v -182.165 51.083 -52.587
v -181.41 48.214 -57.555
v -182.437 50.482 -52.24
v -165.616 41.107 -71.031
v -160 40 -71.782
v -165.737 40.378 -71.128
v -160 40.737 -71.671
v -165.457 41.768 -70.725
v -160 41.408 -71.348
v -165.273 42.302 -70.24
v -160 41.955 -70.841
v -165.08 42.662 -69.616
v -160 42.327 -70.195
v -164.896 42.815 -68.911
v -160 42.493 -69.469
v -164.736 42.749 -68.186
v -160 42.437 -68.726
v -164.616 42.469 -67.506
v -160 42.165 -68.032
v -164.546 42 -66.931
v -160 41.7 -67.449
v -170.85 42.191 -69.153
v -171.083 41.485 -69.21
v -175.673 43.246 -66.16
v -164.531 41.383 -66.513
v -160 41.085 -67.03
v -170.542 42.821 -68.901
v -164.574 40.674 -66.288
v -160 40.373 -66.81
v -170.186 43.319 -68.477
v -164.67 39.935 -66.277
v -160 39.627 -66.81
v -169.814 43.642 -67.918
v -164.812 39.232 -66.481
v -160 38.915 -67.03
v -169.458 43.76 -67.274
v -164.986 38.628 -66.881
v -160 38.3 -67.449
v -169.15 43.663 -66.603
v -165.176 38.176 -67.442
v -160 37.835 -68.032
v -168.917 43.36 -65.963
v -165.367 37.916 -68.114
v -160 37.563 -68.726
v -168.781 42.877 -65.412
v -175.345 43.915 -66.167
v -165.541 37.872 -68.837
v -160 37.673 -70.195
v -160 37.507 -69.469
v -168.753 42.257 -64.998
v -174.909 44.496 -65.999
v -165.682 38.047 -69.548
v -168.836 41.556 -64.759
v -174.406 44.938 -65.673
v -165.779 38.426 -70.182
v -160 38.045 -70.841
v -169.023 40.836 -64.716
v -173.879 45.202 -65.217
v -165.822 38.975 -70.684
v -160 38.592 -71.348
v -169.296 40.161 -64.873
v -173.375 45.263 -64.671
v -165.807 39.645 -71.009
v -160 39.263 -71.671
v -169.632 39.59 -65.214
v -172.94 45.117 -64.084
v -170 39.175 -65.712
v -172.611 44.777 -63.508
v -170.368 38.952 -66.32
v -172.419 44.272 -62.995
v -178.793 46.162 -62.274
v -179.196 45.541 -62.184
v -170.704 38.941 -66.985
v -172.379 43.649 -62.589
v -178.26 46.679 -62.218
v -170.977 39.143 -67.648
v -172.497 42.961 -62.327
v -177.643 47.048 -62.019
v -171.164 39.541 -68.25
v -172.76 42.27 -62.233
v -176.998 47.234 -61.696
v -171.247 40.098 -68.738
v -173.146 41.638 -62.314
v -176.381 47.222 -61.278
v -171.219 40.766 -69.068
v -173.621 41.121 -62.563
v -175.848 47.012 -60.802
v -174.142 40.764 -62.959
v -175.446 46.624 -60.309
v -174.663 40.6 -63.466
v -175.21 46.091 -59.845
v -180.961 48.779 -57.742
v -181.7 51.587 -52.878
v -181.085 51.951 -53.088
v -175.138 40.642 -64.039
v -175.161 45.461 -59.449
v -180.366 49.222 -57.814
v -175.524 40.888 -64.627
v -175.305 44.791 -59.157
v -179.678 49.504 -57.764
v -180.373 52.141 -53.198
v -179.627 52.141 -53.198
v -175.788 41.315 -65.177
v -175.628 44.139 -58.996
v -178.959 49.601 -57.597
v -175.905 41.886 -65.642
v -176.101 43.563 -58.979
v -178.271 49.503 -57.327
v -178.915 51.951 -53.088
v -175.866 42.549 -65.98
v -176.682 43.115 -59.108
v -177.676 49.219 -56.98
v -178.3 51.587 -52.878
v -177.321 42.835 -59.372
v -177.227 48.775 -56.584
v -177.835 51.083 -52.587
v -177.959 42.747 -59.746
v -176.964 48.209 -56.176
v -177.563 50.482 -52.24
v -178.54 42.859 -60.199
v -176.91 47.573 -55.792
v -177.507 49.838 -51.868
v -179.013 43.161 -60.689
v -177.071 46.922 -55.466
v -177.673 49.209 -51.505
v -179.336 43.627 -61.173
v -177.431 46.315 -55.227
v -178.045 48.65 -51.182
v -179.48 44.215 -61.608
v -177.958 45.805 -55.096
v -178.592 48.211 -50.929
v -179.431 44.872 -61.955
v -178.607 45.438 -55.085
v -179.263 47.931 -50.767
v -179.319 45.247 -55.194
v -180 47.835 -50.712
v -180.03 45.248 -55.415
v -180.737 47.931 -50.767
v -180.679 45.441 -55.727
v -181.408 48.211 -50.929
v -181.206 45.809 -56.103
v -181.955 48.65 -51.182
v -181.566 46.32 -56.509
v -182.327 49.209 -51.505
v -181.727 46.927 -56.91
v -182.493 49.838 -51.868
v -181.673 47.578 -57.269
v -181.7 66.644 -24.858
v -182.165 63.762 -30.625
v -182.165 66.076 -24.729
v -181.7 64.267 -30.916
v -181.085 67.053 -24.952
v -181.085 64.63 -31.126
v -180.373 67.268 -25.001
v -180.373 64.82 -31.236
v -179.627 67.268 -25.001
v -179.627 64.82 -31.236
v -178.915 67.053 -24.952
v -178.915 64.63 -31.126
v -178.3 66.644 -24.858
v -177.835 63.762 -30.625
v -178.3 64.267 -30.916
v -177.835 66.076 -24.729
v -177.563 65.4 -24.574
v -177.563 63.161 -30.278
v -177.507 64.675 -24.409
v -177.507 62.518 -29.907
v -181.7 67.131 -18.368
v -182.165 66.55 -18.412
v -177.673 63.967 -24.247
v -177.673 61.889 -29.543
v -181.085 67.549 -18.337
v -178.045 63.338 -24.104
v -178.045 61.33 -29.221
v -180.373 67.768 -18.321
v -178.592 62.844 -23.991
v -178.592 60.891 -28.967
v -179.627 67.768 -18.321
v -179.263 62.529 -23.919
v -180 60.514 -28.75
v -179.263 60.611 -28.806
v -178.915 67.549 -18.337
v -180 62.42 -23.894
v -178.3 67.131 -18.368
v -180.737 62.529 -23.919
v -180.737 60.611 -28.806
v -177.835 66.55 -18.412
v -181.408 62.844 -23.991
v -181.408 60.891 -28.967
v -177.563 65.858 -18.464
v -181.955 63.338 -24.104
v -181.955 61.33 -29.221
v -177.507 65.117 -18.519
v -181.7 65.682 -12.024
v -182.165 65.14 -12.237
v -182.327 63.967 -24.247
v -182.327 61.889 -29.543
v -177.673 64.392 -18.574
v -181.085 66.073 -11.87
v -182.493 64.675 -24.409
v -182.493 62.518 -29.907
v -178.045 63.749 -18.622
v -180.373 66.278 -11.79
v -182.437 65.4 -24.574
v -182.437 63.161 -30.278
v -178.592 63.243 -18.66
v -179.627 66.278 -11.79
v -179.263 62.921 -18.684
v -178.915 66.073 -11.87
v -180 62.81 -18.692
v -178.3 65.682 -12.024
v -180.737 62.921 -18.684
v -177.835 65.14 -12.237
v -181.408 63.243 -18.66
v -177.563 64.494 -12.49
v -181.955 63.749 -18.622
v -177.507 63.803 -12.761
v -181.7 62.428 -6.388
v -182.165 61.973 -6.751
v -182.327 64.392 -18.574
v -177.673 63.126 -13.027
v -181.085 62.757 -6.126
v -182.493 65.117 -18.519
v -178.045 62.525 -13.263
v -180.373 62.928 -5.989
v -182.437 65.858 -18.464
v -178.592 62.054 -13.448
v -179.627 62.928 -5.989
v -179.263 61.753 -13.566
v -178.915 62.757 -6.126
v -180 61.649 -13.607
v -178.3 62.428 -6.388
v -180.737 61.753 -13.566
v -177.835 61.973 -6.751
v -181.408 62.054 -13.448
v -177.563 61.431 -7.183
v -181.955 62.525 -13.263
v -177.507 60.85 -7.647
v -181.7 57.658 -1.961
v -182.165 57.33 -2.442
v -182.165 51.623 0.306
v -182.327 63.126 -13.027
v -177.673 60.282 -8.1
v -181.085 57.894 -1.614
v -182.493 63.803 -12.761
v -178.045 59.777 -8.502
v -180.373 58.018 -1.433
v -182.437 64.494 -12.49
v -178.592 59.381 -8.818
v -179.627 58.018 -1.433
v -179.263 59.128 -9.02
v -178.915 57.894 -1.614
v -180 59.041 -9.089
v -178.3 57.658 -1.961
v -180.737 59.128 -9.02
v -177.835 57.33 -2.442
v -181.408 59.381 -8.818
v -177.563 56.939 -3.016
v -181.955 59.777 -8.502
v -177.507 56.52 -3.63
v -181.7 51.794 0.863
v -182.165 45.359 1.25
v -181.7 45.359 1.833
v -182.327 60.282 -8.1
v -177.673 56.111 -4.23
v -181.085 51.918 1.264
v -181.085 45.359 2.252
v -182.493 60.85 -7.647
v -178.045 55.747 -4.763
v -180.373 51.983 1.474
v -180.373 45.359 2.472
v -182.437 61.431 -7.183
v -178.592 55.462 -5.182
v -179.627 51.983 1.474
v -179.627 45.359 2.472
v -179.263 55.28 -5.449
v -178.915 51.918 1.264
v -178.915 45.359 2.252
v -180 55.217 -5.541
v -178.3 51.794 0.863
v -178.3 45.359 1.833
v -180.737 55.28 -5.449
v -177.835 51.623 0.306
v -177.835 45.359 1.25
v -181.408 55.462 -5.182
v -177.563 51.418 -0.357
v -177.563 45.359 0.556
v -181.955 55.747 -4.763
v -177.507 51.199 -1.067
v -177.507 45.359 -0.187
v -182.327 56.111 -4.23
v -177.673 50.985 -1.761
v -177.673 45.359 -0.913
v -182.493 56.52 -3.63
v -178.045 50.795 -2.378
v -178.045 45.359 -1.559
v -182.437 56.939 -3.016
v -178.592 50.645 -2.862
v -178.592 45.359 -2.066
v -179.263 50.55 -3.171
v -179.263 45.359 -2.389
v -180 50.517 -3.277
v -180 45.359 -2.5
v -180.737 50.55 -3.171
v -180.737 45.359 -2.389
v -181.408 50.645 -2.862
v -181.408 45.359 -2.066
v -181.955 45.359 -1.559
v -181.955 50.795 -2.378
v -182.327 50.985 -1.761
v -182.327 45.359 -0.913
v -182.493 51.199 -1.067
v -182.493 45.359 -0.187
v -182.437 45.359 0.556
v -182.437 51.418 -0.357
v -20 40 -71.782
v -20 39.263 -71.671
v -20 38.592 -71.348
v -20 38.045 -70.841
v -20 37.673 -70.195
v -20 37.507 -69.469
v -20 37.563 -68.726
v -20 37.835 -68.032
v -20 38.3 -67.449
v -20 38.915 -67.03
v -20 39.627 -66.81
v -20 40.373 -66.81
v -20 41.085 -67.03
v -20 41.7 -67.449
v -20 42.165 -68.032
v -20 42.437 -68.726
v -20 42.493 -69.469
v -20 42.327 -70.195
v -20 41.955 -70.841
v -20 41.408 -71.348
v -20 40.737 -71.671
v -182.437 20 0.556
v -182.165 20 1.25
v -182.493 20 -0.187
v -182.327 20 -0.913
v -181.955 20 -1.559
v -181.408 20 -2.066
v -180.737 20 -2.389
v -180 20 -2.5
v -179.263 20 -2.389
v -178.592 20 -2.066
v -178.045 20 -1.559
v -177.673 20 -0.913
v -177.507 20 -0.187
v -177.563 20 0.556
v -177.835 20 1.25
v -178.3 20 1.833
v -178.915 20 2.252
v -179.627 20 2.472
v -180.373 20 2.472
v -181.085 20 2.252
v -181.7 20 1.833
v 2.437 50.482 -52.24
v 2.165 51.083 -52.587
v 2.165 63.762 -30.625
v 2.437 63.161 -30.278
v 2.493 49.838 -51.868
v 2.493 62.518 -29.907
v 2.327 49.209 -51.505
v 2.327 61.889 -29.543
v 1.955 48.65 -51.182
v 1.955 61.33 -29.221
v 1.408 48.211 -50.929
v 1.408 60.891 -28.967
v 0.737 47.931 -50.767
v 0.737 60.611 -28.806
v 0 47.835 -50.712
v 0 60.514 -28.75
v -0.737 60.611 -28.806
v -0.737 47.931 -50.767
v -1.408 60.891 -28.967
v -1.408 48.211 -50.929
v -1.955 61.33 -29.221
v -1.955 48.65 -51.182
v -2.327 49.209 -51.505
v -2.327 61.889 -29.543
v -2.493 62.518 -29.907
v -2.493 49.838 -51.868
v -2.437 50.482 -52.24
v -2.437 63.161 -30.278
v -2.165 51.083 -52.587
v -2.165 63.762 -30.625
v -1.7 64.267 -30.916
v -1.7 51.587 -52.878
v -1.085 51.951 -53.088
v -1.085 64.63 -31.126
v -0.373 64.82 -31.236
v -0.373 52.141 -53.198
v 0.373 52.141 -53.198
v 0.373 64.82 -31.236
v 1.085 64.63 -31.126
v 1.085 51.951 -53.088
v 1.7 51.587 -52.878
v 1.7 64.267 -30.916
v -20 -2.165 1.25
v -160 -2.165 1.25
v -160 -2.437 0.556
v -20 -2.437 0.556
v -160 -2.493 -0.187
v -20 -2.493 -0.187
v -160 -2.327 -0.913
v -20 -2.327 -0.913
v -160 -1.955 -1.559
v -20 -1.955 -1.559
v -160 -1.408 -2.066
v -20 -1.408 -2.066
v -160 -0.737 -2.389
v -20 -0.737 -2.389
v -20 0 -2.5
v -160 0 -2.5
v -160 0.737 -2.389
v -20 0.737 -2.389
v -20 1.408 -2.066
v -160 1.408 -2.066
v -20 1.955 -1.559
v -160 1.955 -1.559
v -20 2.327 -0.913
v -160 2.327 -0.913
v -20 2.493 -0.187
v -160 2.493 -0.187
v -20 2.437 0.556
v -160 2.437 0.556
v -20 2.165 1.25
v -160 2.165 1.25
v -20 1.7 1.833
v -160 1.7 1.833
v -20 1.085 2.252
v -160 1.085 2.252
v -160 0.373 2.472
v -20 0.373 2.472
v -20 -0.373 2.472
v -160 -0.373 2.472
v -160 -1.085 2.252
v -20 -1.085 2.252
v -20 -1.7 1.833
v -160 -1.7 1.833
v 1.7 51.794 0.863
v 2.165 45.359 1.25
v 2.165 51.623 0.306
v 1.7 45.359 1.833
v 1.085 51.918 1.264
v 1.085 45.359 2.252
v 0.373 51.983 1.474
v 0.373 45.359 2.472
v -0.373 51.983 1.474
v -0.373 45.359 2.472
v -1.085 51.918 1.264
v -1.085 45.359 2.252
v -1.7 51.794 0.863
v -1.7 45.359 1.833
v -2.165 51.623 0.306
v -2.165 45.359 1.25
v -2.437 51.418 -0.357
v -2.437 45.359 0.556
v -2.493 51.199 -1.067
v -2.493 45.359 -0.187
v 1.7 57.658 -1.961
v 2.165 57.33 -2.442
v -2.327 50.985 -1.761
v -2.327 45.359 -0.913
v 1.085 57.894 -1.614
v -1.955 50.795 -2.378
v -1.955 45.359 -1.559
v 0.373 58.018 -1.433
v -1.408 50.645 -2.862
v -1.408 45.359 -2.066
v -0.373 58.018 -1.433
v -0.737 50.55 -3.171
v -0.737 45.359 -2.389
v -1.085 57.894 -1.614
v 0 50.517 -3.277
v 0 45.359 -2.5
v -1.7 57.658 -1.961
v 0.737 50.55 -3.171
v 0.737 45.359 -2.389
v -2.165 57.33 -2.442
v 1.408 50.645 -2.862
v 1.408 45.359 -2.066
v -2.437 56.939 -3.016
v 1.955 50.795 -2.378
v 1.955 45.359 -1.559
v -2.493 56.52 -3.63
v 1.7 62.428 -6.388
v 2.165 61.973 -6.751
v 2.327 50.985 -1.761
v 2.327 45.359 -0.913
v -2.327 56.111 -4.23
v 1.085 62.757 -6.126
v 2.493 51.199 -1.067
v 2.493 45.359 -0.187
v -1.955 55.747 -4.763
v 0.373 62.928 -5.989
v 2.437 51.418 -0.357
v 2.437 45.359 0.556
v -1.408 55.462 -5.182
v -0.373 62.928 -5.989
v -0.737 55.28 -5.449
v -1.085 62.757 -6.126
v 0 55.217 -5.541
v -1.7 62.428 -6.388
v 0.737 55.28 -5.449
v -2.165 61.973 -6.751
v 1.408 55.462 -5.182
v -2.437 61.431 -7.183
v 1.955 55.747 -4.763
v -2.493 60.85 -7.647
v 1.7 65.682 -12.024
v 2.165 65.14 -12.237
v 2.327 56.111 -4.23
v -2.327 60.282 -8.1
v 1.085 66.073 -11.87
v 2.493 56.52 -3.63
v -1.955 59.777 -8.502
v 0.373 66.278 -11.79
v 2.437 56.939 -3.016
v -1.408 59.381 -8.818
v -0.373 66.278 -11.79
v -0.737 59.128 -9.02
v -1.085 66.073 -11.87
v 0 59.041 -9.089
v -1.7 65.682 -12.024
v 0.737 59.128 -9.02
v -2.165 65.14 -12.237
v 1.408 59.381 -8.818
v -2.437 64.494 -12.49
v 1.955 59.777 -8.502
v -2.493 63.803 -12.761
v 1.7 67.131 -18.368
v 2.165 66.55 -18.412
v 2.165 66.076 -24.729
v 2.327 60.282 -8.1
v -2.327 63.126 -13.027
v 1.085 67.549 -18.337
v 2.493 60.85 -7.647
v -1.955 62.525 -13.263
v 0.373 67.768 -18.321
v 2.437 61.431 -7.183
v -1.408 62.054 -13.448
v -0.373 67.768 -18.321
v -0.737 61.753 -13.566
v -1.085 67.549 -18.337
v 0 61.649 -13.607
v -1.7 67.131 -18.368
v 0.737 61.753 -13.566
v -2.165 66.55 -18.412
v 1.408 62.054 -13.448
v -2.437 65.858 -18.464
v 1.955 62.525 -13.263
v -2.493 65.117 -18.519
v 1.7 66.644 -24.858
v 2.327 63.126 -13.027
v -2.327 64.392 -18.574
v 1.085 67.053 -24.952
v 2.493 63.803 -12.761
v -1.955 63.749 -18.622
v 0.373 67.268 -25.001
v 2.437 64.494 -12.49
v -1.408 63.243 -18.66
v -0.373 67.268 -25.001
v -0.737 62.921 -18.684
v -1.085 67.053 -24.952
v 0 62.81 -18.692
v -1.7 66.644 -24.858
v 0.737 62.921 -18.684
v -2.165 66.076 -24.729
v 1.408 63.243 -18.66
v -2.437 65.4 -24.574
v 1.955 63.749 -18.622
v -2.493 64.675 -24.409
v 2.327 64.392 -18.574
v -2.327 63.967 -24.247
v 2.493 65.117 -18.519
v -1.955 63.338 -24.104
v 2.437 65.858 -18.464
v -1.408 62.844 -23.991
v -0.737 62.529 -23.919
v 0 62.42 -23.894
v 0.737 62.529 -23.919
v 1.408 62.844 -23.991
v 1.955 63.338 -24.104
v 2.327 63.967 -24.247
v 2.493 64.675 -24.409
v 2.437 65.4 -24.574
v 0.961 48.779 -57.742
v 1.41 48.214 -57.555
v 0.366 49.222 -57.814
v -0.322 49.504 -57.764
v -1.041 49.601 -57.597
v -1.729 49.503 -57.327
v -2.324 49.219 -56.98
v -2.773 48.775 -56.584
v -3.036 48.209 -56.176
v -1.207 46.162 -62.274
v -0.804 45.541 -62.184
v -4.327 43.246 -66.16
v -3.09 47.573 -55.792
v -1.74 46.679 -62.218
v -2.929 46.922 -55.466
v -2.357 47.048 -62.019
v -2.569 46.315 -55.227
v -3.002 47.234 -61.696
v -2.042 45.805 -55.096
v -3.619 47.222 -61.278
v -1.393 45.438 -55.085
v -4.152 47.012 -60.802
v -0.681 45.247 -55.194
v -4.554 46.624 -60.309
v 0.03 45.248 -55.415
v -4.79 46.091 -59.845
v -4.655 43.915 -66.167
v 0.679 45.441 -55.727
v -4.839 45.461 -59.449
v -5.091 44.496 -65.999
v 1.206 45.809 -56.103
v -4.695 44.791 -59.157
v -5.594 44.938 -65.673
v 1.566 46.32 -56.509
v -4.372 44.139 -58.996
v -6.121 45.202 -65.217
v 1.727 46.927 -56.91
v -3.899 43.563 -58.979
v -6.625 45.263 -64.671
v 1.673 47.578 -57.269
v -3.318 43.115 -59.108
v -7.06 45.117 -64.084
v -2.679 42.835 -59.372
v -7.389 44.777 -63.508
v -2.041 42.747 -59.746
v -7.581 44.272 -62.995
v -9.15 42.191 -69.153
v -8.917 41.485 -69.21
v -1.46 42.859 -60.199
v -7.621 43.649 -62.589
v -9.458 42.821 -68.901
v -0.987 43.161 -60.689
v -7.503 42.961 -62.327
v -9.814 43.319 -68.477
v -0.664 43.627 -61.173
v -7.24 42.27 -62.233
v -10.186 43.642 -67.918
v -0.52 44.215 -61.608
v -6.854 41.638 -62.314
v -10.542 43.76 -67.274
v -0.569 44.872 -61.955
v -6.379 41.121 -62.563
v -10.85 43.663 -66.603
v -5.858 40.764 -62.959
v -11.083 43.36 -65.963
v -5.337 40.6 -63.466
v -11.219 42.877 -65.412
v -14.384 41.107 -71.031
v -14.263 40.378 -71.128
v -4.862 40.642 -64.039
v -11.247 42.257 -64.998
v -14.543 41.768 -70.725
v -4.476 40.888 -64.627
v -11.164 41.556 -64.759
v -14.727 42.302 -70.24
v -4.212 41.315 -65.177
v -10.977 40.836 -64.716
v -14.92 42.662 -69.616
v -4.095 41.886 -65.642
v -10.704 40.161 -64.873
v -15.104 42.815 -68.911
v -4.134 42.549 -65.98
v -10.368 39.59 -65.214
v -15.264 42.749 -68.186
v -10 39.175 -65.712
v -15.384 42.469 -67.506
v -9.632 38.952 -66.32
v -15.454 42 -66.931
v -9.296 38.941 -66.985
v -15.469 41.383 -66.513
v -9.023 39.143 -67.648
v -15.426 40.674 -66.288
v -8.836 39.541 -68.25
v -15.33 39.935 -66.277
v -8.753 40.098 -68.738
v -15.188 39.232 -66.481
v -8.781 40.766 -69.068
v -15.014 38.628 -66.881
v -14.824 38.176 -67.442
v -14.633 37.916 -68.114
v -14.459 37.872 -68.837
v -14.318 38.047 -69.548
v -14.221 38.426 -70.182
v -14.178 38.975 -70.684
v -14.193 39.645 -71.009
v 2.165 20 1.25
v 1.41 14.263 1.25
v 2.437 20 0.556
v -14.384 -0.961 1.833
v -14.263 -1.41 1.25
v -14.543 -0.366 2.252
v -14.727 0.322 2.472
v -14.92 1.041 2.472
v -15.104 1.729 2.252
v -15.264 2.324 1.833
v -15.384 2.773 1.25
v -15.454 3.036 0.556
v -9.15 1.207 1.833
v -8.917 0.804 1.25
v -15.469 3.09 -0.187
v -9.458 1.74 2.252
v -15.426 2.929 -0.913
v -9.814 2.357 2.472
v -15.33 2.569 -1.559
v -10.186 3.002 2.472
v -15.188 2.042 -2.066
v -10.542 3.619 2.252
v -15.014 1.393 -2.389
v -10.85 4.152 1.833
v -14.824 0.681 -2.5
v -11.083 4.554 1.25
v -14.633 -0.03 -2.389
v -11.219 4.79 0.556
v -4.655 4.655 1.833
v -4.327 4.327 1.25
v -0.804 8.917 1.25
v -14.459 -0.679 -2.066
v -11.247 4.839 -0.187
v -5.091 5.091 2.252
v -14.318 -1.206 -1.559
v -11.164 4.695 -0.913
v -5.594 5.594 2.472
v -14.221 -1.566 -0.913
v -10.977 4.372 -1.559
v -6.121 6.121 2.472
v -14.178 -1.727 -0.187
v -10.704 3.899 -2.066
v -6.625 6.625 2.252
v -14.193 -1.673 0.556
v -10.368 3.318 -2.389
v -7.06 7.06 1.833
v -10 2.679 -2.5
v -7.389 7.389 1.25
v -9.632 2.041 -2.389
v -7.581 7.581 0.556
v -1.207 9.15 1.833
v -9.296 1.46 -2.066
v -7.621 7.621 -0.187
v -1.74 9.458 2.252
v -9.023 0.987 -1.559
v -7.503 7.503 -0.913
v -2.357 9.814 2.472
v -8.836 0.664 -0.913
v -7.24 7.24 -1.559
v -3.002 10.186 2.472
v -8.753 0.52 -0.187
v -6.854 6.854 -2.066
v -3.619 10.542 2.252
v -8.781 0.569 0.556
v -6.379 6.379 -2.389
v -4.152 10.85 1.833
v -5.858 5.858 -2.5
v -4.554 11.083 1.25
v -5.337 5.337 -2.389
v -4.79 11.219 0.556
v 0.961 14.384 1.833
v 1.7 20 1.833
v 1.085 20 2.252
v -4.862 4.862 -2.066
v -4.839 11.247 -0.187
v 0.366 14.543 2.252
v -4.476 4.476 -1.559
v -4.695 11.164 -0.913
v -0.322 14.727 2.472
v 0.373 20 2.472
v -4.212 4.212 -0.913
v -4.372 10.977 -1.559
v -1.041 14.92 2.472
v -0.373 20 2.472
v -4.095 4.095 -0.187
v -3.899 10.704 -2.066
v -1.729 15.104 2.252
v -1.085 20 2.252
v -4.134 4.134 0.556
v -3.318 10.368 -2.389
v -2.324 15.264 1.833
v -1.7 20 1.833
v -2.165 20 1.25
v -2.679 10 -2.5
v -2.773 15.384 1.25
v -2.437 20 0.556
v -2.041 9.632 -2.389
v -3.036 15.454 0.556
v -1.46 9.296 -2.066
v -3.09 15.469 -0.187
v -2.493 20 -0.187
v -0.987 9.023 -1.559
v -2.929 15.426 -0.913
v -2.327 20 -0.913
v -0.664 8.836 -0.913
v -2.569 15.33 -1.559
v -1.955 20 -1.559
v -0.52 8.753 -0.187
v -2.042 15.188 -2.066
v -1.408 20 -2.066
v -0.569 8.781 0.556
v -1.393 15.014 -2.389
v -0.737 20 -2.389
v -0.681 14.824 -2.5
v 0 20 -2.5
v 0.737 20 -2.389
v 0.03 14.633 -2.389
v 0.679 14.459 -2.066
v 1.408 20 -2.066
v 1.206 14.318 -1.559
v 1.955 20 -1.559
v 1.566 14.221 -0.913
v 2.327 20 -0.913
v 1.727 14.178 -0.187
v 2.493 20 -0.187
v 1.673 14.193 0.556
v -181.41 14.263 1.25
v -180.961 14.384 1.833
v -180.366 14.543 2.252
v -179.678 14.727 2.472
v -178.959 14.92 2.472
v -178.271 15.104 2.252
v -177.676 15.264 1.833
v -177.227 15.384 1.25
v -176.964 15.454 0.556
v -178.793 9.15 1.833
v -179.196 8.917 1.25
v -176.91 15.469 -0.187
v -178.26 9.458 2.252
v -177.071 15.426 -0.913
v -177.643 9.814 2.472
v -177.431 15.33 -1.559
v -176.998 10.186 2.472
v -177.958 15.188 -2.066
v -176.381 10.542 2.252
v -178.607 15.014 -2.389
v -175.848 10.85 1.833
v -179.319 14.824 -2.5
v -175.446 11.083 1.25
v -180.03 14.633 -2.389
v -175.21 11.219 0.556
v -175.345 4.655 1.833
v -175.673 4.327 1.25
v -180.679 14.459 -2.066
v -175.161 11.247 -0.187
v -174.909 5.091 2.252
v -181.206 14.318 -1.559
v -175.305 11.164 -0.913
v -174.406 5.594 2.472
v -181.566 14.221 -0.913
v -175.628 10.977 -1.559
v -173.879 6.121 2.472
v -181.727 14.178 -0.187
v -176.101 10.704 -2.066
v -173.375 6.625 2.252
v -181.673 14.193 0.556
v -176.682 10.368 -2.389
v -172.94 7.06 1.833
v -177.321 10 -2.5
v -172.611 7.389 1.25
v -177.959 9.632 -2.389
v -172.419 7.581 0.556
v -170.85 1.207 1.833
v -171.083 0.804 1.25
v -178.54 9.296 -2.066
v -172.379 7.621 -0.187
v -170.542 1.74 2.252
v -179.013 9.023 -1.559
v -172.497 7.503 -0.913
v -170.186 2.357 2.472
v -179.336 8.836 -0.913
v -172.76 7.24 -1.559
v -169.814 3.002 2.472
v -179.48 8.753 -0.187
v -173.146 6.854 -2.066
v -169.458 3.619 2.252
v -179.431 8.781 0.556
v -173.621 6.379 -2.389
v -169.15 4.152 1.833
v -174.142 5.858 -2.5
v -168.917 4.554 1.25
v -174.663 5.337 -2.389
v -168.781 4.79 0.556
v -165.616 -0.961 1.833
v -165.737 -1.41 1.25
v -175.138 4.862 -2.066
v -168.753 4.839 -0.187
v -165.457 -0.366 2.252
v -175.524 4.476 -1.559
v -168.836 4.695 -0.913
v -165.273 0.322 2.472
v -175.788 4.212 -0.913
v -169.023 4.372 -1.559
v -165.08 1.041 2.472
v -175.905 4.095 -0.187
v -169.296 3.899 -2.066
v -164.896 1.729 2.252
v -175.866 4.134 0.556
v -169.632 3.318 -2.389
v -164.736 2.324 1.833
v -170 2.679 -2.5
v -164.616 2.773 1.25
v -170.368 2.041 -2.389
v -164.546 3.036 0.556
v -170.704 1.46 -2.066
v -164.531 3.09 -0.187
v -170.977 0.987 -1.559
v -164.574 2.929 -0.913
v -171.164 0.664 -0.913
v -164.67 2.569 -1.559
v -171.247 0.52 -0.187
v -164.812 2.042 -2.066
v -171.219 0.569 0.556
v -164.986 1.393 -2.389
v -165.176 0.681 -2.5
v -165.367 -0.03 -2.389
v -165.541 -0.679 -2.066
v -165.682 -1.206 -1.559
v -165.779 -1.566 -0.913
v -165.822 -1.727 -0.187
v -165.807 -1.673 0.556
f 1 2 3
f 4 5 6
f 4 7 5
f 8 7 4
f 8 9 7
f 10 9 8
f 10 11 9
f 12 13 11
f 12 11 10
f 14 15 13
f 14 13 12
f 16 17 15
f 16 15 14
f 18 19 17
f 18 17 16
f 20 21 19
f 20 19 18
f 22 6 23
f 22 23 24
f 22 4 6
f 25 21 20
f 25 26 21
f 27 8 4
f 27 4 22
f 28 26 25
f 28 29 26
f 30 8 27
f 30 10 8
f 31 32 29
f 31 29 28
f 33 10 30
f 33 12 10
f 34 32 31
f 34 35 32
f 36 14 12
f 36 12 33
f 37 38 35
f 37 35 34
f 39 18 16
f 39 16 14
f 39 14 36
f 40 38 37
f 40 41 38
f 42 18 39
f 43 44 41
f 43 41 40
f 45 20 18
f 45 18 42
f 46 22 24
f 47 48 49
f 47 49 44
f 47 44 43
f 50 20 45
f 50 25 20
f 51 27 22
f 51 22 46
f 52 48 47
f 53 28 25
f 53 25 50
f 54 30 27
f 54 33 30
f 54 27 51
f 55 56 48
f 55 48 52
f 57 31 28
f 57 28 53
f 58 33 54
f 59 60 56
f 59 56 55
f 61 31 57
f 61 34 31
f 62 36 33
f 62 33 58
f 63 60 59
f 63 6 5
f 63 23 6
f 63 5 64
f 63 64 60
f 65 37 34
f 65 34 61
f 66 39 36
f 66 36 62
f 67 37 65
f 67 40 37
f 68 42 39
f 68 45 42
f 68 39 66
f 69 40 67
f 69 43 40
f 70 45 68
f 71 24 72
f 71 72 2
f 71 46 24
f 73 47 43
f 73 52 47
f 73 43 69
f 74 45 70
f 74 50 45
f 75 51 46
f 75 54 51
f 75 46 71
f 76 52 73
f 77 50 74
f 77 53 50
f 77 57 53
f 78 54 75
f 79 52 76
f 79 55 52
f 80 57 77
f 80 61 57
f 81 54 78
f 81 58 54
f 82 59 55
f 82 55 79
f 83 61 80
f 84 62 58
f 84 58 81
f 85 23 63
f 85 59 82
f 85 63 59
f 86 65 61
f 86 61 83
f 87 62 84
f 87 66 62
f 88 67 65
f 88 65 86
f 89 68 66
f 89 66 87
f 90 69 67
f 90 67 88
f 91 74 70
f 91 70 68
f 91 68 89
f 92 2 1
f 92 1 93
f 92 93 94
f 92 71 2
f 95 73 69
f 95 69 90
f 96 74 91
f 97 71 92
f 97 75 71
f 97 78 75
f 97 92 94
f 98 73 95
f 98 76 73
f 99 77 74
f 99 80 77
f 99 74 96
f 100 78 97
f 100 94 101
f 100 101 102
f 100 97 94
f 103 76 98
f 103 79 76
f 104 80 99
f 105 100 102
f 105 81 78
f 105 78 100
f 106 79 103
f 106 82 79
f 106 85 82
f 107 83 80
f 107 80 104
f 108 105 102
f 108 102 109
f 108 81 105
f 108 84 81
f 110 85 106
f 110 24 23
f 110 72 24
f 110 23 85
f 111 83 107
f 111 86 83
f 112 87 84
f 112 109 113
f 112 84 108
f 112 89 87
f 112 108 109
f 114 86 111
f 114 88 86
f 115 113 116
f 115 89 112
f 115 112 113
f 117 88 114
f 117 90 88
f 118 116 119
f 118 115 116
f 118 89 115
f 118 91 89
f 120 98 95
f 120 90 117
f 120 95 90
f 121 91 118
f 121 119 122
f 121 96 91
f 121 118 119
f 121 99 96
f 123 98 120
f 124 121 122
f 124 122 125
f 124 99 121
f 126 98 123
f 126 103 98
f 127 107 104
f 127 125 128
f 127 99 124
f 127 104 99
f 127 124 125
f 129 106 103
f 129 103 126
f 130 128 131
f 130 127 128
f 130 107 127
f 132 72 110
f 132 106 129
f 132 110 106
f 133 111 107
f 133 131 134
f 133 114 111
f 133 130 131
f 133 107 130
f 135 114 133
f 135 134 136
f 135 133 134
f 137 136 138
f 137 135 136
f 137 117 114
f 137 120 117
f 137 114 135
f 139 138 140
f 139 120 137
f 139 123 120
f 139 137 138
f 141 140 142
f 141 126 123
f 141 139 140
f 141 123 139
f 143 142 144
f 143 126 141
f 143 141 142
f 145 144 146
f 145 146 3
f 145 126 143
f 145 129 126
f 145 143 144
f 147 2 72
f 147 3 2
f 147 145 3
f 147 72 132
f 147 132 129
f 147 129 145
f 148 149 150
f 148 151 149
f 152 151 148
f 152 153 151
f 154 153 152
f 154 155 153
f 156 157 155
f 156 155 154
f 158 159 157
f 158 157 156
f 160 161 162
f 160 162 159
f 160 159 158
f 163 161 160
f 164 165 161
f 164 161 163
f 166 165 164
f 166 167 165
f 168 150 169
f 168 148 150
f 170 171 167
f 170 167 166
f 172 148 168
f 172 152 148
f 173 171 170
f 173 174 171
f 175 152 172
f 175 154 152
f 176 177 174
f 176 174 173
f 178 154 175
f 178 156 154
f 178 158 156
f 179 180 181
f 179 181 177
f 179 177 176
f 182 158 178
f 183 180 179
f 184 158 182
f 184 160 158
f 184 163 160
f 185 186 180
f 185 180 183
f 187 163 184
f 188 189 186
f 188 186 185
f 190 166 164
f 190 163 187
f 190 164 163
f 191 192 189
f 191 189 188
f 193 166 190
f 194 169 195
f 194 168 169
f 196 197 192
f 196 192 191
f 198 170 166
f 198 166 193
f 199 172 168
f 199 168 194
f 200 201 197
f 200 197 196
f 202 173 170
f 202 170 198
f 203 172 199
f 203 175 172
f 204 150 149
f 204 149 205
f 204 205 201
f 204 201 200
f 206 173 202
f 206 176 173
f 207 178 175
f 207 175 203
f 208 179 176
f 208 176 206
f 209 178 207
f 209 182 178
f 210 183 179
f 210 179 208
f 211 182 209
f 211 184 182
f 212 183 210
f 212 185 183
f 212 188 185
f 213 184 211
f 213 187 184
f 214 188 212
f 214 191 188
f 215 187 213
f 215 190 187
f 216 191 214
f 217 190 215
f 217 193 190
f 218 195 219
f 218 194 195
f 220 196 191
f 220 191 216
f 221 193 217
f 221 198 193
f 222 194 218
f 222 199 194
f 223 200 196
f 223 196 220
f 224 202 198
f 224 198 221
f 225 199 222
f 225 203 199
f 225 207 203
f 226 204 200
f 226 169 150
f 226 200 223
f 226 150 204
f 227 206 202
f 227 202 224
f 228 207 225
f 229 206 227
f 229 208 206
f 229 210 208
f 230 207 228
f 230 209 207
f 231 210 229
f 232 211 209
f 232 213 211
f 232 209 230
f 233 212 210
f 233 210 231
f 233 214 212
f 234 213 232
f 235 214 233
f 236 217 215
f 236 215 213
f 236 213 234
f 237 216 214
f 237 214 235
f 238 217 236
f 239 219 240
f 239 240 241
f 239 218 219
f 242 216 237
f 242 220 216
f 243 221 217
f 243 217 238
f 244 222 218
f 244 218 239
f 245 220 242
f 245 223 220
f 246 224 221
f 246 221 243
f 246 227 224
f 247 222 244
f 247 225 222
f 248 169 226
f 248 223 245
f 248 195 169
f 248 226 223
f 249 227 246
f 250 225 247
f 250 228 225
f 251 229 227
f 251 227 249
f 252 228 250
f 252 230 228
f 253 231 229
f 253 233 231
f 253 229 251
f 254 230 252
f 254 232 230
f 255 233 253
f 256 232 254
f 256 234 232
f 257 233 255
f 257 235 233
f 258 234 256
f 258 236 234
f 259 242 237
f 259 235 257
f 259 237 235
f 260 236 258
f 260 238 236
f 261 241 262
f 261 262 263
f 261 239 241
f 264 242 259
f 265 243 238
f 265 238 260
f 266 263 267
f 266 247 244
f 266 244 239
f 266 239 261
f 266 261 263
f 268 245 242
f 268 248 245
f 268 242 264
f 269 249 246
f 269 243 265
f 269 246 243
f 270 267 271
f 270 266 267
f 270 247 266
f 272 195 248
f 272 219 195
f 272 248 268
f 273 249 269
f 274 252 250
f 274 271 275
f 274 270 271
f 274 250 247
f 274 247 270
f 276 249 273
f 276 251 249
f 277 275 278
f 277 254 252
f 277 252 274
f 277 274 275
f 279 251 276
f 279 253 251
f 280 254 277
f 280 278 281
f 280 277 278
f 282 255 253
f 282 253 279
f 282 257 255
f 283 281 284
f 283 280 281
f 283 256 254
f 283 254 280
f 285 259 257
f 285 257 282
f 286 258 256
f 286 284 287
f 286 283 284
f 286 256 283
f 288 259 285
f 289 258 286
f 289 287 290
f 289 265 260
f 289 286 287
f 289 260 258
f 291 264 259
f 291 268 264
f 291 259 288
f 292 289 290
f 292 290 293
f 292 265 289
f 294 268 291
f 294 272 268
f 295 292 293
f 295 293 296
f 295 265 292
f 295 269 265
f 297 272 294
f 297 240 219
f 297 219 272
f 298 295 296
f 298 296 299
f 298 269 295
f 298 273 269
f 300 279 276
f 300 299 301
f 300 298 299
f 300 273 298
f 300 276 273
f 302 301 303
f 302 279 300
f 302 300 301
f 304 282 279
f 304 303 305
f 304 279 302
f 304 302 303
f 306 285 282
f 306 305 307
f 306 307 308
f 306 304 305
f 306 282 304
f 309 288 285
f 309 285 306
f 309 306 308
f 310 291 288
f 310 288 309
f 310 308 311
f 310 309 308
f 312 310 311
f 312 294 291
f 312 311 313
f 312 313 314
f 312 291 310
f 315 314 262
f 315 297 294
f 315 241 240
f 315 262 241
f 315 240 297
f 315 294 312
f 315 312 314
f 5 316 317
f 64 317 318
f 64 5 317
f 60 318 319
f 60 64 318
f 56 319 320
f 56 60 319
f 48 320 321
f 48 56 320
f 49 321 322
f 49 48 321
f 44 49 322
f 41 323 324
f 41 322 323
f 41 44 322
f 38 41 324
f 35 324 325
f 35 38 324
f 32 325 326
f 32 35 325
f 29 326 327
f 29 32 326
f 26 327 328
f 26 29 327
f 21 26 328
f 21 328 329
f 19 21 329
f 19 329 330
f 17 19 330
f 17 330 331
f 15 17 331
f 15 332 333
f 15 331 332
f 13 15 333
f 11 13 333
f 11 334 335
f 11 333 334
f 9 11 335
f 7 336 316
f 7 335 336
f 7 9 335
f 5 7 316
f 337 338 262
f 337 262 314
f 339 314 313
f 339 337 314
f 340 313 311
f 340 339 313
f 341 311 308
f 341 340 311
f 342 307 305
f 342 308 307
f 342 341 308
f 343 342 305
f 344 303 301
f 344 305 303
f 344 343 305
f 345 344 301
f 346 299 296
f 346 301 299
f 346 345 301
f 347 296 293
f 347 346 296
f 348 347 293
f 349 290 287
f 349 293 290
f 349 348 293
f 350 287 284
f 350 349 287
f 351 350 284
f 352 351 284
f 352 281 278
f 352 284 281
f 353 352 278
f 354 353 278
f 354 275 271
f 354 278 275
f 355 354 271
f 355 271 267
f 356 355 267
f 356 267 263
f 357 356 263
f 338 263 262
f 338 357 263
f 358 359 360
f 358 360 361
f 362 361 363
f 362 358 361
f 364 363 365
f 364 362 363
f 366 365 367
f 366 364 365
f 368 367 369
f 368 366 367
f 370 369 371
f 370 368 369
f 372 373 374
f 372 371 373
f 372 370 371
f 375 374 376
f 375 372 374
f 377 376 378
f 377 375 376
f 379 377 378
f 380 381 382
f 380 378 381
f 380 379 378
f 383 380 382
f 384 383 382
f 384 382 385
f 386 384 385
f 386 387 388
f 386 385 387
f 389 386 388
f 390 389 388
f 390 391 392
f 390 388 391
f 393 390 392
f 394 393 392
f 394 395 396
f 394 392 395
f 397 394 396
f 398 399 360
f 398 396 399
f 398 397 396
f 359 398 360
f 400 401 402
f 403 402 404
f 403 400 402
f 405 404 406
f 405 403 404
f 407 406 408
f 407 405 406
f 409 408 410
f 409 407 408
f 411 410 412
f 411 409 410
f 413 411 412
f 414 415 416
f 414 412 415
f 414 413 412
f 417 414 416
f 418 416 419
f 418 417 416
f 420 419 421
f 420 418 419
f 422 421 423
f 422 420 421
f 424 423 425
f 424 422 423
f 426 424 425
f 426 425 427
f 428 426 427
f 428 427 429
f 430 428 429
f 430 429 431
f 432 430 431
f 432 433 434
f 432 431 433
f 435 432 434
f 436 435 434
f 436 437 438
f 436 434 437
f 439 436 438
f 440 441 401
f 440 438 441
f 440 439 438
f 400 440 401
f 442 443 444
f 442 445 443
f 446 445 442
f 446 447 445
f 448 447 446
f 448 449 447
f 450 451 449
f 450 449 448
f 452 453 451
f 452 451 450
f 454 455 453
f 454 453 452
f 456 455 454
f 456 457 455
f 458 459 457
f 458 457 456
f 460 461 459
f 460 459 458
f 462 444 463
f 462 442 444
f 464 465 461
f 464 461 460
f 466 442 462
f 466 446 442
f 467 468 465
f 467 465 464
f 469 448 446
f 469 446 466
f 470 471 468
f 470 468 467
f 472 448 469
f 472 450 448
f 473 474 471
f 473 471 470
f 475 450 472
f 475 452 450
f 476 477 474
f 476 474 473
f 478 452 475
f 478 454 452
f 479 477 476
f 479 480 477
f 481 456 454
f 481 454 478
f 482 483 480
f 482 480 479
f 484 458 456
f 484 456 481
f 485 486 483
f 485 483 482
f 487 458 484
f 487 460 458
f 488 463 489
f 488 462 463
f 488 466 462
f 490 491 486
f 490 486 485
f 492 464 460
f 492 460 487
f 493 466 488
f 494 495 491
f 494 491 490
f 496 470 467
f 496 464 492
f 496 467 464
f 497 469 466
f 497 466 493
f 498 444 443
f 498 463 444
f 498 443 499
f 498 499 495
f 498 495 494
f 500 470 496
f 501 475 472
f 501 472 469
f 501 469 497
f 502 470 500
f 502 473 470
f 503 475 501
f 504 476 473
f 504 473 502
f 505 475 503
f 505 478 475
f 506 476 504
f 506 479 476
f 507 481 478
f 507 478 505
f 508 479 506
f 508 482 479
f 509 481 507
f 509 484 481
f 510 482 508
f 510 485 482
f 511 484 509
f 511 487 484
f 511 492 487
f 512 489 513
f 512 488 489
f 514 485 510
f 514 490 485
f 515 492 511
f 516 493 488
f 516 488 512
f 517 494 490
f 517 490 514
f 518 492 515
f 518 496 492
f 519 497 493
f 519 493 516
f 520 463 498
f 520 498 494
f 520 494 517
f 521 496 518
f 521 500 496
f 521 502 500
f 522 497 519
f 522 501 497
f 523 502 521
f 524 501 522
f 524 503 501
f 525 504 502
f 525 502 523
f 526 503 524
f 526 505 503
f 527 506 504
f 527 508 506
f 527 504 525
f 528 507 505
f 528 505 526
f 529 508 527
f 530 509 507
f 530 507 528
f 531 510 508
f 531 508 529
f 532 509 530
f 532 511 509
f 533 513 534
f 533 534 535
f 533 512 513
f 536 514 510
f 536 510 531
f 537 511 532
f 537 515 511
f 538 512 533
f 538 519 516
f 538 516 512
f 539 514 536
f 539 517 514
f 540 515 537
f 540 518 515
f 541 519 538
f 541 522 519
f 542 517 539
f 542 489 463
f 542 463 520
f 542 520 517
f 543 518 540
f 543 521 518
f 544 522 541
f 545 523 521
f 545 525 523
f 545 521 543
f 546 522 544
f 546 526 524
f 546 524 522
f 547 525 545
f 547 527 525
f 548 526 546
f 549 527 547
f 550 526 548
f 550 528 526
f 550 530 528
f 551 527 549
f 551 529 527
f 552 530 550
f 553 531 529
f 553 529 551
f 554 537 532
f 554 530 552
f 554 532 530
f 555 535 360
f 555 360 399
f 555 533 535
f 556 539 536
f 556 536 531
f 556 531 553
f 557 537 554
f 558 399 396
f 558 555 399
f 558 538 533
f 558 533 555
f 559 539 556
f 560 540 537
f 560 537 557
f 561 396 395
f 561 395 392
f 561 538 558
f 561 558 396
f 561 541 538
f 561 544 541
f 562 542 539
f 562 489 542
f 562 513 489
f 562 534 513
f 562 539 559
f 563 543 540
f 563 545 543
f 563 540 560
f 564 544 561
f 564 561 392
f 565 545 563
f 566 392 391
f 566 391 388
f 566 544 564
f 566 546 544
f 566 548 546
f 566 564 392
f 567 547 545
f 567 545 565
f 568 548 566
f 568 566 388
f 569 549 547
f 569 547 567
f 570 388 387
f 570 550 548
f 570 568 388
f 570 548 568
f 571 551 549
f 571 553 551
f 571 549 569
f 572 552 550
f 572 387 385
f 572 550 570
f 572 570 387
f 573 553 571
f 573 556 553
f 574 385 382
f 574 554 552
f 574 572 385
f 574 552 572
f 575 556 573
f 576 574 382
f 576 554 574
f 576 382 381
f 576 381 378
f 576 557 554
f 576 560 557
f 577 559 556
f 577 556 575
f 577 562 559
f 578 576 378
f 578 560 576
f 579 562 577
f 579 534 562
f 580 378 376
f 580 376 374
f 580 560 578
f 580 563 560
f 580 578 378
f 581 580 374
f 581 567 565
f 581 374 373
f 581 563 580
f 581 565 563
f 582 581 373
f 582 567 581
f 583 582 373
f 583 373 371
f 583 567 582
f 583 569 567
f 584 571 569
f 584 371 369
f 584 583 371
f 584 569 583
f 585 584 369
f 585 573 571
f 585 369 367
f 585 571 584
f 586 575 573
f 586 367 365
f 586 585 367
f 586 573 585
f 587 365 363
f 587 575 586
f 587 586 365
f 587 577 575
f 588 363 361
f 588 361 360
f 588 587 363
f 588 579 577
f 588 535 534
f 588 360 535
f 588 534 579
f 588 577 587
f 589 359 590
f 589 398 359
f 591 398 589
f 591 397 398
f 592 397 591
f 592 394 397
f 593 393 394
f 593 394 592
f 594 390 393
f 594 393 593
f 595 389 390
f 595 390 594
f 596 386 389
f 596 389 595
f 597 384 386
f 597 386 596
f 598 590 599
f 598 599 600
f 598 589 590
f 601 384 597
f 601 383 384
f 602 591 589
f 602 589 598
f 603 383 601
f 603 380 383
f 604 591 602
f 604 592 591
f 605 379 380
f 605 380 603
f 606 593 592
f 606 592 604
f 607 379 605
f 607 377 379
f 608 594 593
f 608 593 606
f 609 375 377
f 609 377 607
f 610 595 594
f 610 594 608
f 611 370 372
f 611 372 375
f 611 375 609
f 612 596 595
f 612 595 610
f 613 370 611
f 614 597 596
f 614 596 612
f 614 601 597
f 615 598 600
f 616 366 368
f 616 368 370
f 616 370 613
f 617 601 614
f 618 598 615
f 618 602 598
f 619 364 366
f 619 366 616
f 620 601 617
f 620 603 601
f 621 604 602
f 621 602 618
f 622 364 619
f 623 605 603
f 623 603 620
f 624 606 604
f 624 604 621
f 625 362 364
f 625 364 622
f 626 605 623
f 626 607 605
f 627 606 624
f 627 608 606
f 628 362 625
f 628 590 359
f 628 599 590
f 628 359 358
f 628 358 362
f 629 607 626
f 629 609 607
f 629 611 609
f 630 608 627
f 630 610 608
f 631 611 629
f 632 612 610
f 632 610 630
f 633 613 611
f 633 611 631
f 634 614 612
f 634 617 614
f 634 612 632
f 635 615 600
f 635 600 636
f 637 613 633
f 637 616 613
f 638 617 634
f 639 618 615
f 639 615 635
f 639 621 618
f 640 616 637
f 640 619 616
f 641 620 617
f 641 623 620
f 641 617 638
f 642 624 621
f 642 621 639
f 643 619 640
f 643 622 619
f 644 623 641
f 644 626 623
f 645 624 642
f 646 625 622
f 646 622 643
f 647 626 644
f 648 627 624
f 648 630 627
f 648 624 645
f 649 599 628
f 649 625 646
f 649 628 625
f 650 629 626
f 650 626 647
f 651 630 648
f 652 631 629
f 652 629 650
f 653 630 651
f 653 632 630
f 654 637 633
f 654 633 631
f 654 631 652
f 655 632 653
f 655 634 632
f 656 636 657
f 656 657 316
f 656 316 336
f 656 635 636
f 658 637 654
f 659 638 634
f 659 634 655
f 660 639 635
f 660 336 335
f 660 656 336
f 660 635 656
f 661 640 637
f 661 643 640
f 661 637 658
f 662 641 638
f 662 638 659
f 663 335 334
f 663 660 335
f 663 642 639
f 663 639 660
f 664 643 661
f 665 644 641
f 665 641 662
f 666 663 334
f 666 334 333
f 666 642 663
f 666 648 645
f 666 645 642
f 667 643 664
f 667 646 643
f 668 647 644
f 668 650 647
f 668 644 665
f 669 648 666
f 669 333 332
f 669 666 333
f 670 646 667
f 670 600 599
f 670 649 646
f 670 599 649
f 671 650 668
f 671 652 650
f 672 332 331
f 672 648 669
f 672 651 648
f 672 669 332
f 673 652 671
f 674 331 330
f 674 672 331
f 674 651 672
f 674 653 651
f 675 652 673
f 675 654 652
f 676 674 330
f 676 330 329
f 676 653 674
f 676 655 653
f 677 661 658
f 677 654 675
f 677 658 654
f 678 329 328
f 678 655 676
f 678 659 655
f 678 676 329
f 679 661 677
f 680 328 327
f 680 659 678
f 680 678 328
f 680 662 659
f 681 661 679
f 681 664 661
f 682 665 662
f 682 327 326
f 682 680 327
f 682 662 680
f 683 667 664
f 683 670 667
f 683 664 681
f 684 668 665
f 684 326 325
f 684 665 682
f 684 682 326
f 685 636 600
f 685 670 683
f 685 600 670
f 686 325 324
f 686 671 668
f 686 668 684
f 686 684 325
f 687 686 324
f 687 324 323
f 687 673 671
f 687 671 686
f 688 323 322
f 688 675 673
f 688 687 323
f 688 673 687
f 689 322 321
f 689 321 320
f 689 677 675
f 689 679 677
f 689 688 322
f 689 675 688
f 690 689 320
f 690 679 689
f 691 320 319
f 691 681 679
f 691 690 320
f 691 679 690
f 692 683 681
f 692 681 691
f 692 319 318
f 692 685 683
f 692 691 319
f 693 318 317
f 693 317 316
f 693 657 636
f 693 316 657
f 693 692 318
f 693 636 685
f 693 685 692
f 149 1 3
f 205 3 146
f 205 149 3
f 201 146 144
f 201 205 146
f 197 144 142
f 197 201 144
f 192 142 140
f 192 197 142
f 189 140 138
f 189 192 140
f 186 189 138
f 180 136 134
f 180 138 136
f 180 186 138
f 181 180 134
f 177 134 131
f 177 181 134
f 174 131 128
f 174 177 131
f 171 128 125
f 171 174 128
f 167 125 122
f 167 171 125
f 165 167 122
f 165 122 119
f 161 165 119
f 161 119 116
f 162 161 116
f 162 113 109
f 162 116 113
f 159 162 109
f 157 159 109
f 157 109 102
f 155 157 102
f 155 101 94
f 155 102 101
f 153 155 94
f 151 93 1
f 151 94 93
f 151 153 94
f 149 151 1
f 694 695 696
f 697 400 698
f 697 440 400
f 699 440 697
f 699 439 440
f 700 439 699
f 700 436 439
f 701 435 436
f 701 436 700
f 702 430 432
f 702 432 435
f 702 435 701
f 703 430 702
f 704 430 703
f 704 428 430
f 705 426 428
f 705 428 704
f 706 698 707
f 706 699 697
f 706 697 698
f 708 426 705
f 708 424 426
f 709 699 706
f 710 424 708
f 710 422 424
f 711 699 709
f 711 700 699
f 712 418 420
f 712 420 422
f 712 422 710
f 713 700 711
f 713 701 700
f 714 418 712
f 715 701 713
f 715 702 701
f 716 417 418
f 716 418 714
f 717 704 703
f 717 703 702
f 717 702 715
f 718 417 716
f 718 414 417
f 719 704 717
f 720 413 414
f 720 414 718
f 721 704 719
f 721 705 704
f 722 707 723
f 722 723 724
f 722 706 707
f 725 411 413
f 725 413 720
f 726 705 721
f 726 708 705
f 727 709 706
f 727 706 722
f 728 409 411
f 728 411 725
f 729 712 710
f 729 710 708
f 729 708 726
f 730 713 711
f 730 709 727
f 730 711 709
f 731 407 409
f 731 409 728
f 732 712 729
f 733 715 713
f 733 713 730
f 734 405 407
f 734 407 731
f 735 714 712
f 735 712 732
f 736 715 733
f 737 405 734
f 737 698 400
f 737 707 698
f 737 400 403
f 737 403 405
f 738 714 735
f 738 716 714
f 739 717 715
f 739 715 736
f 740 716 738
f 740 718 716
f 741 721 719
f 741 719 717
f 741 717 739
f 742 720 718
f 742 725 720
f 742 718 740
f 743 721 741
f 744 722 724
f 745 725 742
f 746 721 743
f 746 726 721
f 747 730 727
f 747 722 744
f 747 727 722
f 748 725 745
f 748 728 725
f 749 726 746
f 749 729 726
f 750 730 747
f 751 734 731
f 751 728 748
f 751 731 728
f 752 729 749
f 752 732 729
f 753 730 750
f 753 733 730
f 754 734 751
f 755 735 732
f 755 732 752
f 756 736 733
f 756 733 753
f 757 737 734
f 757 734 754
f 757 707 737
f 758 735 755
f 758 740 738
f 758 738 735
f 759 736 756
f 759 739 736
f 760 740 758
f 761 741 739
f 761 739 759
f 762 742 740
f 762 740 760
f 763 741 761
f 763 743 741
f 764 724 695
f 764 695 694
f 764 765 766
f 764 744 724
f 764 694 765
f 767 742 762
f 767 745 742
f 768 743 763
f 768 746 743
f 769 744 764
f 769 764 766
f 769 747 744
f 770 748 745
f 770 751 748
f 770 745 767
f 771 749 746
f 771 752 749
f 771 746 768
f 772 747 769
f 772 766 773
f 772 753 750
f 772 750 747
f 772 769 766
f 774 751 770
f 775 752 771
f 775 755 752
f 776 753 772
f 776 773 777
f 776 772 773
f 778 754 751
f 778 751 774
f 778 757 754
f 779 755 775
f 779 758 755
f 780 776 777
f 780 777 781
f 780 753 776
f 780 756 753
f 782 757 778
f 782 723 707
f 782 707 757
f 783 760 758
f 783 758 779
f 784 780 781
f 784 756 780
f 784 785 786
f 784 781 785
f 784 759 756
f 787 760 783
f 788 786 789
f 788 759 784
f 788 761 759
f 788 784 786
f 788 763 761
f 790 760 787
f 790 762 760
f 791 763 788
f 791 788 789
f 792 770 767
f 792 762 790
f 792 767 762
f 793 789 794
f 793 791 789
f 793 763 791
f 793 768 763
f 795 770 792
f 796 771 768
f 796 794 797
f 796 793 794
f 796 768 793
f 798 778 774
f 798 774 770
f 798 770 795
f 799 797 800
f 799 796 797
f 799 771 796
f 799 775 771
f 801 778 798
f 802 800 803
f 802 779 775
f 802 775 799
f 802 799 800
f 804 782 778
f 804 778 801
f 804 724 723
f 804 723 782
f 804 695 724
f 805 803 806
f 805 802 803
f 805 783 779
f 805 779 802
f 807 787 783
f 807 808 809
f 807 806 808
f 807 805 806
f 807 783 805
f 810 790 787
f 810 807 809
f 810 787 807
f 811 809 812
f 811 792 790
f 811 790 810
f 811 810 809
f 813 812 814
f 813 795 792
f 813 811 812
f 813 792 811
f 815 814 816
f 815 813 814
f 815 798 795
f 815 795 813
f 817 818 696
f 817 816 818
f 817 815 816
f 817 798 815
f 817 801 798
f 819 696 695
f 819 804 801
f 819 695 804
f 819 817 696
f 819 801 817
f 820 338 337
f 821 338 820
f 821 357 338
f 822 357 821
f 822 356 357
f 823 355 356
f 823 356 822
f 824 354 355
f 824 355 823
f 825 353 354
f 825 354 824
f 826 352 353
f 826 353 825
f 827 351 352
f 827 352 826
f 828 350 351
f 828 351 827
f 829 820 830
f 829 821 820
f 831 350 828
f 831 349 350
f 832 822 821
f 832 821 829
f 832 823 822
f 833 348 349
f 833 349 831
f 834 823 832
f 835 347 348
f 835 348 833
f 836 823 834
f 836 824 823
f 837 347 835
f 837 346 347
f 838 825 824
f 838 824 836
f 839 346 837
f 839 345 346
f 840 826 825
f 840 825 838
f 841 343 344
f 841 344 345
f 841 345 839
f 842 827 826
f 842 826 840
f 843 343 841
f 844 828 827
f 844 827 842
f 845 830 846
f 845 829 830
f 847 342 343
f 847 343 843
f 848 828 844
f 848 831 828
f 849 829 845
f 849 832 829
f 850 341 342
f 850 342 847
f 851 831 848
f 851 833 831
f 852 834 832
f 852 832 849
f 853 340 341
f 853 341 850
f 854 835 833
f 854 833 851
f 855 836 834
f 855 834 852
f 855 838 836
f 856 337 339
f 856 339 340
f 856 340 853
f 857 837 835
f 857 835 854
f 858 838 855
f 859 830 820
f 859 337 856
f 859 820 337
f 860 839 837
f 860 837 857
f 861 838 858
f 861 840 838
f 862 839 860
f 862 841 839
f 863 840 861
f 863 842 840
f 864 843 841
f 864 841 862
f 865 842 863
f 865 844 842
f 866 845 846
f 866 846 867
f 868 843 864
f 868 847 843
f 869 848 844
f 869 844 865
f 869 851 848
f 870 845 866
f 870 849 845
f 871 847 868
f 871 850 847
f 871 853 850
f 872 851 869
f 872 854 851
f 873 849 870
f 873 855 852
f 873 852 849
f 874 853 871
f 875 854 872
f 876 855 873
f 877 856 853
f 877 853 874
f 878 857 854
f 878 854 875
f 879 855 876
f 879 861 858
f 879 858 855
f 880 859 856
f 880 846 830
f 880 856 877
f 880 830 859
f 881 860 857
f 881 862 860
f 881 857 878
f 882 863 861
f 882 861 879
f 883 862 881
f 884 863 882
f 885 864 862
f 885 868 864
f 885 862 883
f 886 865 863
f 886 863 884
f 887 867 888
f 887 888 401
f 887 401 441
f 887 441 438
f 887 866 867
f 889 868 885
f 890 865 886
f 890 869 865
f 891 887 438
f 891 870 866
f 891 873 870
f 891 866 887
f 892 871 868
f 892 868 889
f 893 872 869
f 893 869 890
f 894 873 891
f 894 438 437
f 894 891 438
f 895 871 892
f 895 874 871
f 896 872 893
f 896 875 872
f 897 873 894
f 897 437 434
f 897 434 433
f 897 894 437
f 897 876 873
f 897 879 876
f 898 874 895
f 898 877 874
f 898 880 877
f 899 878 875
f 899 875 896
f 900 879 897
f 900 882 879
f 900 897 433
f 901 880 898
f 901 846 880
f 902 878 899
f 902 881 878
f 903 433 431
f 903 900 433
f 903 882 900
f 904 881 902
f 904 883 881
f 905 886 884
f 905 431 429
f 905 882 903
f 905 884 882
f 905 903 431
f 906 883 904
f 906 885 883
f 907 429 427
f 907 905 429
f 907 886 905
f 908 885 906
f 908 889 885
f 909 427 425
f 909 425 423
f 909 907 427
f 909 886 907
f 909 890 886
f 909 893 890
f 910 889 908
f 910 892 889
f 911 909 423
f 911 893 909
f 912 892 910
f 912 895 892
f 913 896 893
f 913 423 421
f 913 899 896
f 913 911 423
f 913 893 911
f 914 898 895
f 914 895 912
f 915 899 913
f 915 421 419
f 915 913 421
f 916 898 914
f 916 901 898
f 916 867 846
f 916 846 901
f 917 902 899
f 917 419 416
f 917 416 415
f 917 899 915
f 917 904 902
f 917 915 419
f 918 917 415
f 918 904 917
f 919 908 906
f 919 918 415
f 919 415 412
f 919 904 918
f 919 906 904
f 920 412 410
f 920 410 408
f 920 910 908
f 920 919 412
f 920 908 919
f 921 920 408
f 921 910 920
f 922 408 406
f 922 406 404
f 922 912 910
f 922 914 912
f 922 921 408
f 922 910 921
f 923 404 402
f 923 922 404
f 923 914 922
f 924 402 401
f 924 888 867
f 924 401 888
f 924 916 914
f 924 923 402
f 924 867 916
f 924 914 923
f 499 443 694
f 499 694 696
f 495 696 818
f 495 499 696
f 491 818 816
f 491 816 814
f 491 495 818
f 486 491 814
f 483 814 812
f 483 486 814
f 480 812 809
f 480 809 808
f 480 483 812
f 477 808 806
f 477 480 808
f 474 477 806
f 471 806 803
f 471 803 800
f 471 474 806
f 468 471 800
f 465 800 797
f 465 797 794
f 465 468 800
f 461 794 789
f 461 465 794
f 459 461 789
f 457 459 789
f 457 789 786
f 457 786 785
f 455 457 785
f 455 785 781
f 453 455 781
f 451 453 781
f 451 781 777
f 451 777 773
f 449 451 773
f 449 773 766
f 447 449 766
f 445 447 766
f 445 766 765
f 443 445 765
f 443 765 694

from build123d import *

# Parameters (mm, degrees)
SKETCH_3_R = 2.5


with BuildPart() as part:
    # 扫描1: sweep along a curve in space
    with BuildLine() as sweep_1_path:
        Line((0, 20, 0), (0, 45.358983849, 0))
        ThreePointArc((0, 45.358983849, 0), (0, 62.679491924, -10), (0, 62.679491924, -30))
        Line((0, 62.679491924, -30), (0, 50, -51.961524227))
        ThreePointArc((0, 50, -51.961524227), (-5.857864376, 42.928932188, -64.208972941), (-20, 40, -69.282032303))
        Line((-20, 40, -69.282032303), (-160, 40, -69.282032303))
        ThreePointArc((-180, 50, -51.961524227), (-174.142135624, 42.928932188, -64.208972941), (-160, 40, -69.282032303))
        Line((-180, 50, -51.961524227), (-180, 62.679491924, -30))
        ThreePointArc((-180, 62.679491924, -30), (-180, 62.679491924, -10), (-180, 45.358983849, 0))
        Line((-180, 45.358983849, 0), (-180, 20, 0))
        ThreePointArc((-180, 20, 0), (-174.142135624, 5.857864376, 0), (-160, 0, 0))
        Line((-160, 0, 0), (-20, 0, 0))
        ThreePointArc((-20, 0, 0), (-5.857864376, 5.857864376, 0), (0, 20, 0))
    # 草图3 → 扫描1 (sweep)
    with BuildSketch(Plane(origin=(-50, 0, 0), x_dir=(0, 0, -1), z_dir=(1, 0, 0))):
        with Locations((69.282032303, 40)):
            Circle(SKETCH_3_R)
    sweep(path=sweep_1_path.line)


solid = part.part
